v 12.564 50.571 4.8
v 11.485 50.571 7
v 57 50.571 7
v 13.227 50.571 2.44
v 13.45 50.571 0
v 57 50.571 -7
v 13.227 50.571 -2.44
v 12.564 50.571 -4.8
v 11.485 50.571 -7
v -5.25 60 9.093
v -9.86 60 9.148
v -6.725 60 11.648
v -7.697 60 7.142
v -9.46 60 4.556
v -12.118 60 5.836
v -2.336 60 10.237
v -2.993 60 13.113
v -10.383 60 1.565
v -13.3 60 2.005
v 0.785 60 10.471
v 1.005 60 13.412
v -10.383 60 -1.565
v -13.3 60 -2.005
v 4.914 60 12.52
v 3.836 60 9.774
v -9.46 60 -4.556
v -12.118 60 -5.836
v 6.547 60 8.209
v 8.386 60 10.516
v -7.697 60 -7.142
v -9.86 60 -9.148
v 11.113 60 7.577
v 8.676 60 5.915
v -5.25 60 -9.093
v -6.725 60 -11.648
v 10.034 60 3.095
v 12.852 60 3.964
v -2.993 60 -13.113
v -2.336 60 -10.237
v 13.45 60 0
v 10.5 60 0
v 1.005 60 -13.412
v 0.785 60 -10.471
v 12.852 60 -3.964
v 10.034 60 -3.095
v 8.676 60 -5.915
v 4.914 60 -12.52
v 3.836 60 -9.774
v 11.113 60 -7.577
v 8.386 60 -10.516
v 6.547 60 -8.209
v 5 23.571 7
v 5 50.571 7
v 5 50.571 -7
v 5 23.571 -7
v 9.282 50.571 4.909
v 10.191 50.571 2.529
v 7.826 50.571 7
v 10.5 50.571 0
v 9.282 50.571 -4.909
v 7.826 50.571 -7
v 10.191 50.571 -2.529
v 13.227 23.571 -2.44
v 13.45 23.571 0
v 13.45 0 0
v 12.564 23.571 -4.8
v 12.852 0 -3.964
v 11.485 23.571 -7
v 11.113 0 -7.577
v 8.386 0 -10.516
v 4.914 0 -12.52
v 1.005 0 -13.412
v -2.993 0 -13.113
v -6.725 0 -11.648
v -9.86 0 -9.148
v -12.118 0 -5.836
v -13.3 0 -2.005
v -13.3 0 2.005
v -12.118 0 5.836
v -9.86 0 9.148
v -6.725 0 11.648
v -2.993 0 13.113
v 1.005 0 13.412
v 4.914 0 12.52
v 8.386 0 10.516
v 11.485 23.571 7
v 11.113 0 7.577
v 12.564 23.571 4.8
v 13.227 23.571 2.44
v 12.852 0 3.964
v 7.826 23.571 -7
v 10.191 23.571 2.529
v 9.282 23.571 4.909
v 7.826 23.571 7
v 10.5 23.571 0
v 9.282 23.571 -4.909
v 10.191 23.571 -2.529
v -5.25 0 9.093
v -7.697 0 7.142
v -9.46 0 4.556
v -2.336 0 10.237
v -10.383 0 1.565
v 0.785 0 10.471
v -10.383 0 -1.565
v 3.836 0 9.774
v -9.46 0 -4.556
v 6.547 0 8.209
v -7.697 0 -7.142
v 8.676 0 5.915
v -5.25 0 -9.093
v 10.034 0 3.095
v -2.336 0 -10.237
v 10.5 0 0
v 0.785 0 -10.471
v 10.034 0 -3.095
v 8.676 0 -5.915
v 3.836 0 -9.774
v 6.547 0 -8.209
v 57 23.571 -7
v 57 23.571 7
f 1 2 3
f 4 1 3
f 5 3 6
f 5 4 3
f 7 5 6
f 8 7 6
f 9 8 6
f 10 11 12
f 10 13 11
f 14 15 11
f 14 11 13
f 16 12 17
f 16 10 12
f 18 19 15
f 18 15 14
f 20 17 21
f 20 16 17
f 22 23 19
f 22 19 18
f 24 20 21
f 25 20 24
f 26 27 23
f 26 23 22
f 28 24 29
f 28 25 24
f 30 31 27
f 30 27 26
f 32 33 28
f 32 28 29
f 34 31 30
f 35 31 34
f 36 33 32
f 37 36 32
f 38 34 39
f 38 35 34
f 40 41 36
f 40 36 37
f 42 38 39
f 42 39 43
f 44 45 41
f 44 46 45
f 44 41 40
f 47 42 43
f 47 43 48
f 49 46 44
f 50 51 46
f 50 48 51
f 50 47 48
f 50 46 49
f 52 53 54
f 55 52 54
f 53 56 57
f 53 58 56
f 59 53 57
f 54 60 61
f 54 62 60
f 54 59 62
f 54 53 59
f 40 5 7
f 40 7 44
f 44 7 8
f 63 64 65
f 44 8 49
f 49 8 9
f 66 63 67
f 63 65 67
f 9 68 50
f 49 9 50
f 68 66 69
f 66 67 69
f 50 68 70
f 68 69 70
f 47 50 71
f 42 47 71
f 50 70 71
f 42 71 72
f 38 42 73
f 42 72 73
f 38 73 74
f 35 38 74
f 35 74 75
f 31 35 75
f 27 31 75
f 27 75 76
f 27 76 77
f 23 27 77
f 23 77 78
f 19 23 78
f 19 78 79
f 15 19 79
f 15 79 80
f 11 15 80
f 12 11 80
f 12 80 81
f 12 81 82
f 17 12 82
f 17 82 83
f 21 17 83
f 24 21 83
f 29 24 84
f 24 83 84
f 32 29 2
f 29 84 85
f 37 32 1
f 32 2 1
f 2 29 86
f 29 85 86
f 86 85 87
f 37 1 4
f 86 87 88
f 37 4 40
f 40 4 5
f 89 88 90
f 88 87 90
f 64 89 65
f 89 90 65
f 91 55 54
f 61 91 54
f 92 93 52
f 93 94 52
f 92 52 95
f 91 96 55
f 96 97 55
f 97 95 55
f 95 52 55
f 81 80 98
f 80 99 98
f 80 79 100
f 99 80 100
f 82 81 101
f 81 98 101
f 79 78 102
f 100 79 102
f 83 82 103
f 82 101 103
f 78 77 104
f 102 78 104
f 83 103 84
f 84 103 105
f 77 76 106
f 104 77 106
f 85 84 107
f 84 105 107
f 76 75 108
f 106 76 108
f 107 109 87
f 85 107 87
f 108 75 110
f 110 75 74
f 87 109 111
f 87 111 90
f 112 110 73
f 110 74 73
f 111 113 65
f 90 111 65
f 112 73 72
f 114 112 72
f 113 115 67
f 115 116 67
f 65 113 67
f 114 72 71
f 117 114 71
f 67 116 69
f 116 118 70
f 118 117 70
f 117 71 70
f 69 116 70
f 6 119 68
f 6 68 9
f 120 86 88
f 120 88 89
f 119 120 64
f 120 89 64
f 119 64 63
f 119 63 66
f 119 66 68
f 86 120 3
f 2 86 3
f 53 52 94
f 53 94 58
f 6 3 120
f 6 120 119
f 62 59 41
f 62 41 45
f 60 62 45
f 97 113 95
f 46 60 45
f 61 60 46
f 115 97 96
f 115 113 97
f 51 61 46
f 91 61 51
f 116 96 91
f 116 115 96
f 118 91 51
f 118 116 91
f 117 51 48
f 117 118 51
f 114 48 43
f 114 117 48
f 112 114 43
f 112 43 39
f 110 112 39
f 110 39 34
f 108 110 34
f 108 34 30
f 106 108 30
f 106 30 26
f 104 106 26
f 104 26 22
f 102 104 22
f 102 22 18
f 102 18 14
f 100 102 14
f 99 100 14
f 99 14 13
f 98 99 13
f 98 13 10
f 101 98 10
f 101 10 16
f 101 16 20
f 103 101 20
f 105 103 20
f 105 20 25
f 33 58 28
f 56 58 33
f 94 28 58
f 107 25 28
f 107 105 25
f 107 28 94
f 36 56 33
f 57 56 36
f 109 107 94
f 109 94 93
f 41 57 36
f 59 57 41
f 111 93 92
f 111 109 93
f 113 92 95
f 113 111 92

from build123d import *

# Parameters (mm, degrees)
SKETCH_1_R             = 13.45
SKETCH_1_R_2           = 10.5
EXTRUDE_1_DEPTH        = 60
EXTRUDE_1_2_DEPTH      = 47
EXTRUDE_1_2_DEPTH_BACK = 5
SKETCH_2_W             = 14
SKETCH_2_H             = 27


with BuildPart() as part:
    # 草圖1 → Extrude 1 (new body)
    with BuildSketch(Plane(origin=(0, 0, 0), x_dir=(1, 0, 0), z_dir=(0, 1, 0))):
        Circle(SKETCH_1_R)
        Circle(SKETCH_1_R_2, mode=Mode.SUBTRACT)
    extrude(amount=EXTRUDE_1_DEPTH)

    # 草圖2 → Extrude 1 2 (add, two sides: drawn at the far end of the back side and taken through both)
    with BuildSketch(Plane(origin=(10, 0, 0), x_dir=(0, 0, -1), z_dir=(1, 0, 0)).offset(-EXTRUDE_1_2_DEPTH_BACK)):
        with Locations((0, 37.071329062)):
            Rectangle(SKETCH_2_W, SKETCH_2_H)
    extrude(amount=EXTRUDE_1_2_DEPTH + EXTRUDE_1_2_DEPTH_BACK)


solid = part.part
